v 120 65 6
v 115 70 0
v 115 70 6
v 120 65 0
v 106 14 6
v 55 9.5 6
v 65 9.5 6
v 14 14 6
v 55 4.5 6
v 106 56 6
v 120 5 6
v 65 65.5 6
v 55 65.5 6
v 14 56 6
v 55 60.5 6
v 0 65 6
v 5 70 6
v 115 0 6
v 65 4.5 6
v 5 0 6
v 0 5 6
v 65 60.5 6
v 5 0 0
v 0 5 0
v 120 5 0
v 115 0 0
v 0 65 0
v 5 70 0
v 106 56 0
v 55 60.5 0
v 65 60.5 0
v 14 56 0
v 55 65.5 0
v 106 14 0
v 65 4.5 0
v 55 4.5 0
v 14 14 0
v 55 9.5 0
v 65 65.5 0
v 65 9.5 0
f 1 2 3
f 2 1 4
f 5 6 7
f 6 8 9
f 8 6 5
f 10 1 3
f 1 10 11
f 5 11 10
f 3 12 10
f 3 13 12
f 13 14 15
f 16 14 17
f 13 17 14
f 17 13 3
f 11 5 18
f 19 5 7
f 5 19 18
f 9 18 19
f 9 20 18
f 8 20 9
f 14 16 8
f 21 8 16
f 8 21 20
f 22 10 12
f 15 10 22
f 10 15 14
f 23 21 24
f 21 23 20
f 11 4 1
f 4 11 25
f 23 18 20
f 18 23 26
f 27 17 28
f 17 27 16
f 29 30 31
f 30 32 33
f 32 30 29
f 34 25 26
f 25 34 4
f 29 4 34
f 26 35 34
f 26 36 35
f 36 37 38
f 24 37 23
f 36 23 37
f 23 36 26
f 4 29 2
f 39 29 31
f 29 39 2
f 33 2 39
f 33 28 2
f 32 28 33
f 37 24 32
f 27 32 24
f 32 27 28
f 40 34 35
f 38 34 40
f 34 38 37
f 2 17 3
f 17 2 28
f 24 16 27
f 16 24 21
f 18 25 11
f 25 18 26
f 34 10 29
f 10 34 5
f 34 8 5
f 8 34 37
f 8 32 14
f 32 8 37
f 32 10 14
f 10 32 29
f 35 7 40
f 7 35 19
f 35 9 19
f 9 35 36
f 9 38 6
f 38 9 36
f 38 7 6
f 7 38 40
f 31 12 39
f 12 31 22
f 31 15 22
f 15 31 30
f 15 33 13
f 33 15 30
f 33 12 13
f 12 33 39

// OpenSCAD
$fn = 32;

// ----------------------------------------------------------------------
// Frame plate: 120 x 70 frame, 14 mm rails
// ----------------------------------------------------------------------

// --- parameters (mm) ---
plate_l = 120;            // plate length, X
plate_w = 70;             // plate width, Y
plate_t = 6;              // plate thickness, Z (extrusion height)
corner_c = 5;             // corner chamfer
frame_bar = 14;           // frame rail width
slot_l = 10;              // adjustment slot length
slot_w = 5;               // adjustment slot width

win_l = plate_l - 2 * frame_bar;  // window length
win_w = plate_w - 2 * frame_bar;  // window width

profile = [[5, 0], [115, 0], [120, 5], [120, 65], [115, 70], [5, 70], [0, 65], [0, 5]];  // primary outline, 8 points, counter clockwise
void_1 = [[14, 14], [106, 14], [106, 56], [14, 56]];  // the window, 4 points
void_2 = [[55, 4.5], [65, 4.5], [65, 9.5], [55, 9.5]];  // adjustment slot, 4 points
void_3 = [[55, 60.5], [65, 60.5], [65, 65.5], [55, 65.5]];  // adjustment slot, 4 points

// --- the one profile operation ---
difference() {
  linear_extrude(height = plate_t) polygon(points = profile);
  translate([0, 0, -1])
    linear_extrude(height = plate_t + 2) polygon(points = void_1);
  translate([0, 0, -1])
    linear_extrude(height = plate_t + 2) polygon(points = void_2);
  translate([0, 0, -1])
    linear_extrude(height = plate_t + 2) polygon(points = void_3);
}
